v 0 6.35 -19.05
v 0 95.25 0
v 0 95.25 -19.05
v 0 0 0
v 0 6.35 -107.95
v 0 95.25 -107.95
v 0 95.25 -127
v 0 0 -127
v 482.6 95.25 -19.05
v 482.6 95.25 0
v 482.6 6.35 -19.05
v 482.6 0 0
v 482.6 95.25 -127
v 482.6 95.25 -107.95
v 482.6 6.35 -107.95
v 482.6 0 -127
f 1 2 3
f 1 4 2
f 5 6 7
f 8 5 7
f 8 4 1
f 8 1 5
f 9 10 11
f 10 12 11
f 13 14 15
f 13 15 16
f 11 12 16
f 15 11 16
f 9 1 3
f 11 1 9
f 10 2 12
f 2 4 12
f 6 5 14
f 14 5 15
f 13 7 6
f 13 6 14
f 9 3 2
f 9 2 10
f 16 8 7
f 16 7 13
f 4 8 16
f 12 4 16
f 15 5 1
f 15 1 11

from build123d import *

# Parameters (mm, degrees)
ACRYLIC_SHEET_W     = 482.6
ACRYLIC_SHEET_H     = 127
BOSS_EXTRUDE1_DEPTH = 6.35
SKETCH2_W           = 482.6
SKETCH2_H           = 19.05
BOSS_EXTRUDE2_DEPTH = 88.9


with BuildPart() as part:
    # Acrylic Sheet → Boss-Extrude1 (new body)
    with BuildSketch(Plane(origin=(0, 0, 0), x_dir=(1, 0, 0), z_dir=(0, 1, 0))):
        with Locations((241.3, 63.5)):
            Rectangle(ACRYLIC_SHEET_W, ACRYLIC_SHEET_H)
    extrude(amount=BOSS_EXTRUDE1_DEPTH)

    # Sketch2 → Boss-Extrude2 (add)
    with BuildSketch(Plane(origin=(0, 6.35, 0), x_dir=(1, 0, 0), z_dir=(0, 1, 0))):
        with Locations((241.3, 9.525)):
            Rectangle(SKETCH2_W, SKETCH2_H)
        with Locations((241.3, 117.475)):
            Rectangle(SKETCH2_W, SKETCH2_H)
    extrude(amount=BOSS_EXTRUDE2_DEPTH)


solid = part.part
